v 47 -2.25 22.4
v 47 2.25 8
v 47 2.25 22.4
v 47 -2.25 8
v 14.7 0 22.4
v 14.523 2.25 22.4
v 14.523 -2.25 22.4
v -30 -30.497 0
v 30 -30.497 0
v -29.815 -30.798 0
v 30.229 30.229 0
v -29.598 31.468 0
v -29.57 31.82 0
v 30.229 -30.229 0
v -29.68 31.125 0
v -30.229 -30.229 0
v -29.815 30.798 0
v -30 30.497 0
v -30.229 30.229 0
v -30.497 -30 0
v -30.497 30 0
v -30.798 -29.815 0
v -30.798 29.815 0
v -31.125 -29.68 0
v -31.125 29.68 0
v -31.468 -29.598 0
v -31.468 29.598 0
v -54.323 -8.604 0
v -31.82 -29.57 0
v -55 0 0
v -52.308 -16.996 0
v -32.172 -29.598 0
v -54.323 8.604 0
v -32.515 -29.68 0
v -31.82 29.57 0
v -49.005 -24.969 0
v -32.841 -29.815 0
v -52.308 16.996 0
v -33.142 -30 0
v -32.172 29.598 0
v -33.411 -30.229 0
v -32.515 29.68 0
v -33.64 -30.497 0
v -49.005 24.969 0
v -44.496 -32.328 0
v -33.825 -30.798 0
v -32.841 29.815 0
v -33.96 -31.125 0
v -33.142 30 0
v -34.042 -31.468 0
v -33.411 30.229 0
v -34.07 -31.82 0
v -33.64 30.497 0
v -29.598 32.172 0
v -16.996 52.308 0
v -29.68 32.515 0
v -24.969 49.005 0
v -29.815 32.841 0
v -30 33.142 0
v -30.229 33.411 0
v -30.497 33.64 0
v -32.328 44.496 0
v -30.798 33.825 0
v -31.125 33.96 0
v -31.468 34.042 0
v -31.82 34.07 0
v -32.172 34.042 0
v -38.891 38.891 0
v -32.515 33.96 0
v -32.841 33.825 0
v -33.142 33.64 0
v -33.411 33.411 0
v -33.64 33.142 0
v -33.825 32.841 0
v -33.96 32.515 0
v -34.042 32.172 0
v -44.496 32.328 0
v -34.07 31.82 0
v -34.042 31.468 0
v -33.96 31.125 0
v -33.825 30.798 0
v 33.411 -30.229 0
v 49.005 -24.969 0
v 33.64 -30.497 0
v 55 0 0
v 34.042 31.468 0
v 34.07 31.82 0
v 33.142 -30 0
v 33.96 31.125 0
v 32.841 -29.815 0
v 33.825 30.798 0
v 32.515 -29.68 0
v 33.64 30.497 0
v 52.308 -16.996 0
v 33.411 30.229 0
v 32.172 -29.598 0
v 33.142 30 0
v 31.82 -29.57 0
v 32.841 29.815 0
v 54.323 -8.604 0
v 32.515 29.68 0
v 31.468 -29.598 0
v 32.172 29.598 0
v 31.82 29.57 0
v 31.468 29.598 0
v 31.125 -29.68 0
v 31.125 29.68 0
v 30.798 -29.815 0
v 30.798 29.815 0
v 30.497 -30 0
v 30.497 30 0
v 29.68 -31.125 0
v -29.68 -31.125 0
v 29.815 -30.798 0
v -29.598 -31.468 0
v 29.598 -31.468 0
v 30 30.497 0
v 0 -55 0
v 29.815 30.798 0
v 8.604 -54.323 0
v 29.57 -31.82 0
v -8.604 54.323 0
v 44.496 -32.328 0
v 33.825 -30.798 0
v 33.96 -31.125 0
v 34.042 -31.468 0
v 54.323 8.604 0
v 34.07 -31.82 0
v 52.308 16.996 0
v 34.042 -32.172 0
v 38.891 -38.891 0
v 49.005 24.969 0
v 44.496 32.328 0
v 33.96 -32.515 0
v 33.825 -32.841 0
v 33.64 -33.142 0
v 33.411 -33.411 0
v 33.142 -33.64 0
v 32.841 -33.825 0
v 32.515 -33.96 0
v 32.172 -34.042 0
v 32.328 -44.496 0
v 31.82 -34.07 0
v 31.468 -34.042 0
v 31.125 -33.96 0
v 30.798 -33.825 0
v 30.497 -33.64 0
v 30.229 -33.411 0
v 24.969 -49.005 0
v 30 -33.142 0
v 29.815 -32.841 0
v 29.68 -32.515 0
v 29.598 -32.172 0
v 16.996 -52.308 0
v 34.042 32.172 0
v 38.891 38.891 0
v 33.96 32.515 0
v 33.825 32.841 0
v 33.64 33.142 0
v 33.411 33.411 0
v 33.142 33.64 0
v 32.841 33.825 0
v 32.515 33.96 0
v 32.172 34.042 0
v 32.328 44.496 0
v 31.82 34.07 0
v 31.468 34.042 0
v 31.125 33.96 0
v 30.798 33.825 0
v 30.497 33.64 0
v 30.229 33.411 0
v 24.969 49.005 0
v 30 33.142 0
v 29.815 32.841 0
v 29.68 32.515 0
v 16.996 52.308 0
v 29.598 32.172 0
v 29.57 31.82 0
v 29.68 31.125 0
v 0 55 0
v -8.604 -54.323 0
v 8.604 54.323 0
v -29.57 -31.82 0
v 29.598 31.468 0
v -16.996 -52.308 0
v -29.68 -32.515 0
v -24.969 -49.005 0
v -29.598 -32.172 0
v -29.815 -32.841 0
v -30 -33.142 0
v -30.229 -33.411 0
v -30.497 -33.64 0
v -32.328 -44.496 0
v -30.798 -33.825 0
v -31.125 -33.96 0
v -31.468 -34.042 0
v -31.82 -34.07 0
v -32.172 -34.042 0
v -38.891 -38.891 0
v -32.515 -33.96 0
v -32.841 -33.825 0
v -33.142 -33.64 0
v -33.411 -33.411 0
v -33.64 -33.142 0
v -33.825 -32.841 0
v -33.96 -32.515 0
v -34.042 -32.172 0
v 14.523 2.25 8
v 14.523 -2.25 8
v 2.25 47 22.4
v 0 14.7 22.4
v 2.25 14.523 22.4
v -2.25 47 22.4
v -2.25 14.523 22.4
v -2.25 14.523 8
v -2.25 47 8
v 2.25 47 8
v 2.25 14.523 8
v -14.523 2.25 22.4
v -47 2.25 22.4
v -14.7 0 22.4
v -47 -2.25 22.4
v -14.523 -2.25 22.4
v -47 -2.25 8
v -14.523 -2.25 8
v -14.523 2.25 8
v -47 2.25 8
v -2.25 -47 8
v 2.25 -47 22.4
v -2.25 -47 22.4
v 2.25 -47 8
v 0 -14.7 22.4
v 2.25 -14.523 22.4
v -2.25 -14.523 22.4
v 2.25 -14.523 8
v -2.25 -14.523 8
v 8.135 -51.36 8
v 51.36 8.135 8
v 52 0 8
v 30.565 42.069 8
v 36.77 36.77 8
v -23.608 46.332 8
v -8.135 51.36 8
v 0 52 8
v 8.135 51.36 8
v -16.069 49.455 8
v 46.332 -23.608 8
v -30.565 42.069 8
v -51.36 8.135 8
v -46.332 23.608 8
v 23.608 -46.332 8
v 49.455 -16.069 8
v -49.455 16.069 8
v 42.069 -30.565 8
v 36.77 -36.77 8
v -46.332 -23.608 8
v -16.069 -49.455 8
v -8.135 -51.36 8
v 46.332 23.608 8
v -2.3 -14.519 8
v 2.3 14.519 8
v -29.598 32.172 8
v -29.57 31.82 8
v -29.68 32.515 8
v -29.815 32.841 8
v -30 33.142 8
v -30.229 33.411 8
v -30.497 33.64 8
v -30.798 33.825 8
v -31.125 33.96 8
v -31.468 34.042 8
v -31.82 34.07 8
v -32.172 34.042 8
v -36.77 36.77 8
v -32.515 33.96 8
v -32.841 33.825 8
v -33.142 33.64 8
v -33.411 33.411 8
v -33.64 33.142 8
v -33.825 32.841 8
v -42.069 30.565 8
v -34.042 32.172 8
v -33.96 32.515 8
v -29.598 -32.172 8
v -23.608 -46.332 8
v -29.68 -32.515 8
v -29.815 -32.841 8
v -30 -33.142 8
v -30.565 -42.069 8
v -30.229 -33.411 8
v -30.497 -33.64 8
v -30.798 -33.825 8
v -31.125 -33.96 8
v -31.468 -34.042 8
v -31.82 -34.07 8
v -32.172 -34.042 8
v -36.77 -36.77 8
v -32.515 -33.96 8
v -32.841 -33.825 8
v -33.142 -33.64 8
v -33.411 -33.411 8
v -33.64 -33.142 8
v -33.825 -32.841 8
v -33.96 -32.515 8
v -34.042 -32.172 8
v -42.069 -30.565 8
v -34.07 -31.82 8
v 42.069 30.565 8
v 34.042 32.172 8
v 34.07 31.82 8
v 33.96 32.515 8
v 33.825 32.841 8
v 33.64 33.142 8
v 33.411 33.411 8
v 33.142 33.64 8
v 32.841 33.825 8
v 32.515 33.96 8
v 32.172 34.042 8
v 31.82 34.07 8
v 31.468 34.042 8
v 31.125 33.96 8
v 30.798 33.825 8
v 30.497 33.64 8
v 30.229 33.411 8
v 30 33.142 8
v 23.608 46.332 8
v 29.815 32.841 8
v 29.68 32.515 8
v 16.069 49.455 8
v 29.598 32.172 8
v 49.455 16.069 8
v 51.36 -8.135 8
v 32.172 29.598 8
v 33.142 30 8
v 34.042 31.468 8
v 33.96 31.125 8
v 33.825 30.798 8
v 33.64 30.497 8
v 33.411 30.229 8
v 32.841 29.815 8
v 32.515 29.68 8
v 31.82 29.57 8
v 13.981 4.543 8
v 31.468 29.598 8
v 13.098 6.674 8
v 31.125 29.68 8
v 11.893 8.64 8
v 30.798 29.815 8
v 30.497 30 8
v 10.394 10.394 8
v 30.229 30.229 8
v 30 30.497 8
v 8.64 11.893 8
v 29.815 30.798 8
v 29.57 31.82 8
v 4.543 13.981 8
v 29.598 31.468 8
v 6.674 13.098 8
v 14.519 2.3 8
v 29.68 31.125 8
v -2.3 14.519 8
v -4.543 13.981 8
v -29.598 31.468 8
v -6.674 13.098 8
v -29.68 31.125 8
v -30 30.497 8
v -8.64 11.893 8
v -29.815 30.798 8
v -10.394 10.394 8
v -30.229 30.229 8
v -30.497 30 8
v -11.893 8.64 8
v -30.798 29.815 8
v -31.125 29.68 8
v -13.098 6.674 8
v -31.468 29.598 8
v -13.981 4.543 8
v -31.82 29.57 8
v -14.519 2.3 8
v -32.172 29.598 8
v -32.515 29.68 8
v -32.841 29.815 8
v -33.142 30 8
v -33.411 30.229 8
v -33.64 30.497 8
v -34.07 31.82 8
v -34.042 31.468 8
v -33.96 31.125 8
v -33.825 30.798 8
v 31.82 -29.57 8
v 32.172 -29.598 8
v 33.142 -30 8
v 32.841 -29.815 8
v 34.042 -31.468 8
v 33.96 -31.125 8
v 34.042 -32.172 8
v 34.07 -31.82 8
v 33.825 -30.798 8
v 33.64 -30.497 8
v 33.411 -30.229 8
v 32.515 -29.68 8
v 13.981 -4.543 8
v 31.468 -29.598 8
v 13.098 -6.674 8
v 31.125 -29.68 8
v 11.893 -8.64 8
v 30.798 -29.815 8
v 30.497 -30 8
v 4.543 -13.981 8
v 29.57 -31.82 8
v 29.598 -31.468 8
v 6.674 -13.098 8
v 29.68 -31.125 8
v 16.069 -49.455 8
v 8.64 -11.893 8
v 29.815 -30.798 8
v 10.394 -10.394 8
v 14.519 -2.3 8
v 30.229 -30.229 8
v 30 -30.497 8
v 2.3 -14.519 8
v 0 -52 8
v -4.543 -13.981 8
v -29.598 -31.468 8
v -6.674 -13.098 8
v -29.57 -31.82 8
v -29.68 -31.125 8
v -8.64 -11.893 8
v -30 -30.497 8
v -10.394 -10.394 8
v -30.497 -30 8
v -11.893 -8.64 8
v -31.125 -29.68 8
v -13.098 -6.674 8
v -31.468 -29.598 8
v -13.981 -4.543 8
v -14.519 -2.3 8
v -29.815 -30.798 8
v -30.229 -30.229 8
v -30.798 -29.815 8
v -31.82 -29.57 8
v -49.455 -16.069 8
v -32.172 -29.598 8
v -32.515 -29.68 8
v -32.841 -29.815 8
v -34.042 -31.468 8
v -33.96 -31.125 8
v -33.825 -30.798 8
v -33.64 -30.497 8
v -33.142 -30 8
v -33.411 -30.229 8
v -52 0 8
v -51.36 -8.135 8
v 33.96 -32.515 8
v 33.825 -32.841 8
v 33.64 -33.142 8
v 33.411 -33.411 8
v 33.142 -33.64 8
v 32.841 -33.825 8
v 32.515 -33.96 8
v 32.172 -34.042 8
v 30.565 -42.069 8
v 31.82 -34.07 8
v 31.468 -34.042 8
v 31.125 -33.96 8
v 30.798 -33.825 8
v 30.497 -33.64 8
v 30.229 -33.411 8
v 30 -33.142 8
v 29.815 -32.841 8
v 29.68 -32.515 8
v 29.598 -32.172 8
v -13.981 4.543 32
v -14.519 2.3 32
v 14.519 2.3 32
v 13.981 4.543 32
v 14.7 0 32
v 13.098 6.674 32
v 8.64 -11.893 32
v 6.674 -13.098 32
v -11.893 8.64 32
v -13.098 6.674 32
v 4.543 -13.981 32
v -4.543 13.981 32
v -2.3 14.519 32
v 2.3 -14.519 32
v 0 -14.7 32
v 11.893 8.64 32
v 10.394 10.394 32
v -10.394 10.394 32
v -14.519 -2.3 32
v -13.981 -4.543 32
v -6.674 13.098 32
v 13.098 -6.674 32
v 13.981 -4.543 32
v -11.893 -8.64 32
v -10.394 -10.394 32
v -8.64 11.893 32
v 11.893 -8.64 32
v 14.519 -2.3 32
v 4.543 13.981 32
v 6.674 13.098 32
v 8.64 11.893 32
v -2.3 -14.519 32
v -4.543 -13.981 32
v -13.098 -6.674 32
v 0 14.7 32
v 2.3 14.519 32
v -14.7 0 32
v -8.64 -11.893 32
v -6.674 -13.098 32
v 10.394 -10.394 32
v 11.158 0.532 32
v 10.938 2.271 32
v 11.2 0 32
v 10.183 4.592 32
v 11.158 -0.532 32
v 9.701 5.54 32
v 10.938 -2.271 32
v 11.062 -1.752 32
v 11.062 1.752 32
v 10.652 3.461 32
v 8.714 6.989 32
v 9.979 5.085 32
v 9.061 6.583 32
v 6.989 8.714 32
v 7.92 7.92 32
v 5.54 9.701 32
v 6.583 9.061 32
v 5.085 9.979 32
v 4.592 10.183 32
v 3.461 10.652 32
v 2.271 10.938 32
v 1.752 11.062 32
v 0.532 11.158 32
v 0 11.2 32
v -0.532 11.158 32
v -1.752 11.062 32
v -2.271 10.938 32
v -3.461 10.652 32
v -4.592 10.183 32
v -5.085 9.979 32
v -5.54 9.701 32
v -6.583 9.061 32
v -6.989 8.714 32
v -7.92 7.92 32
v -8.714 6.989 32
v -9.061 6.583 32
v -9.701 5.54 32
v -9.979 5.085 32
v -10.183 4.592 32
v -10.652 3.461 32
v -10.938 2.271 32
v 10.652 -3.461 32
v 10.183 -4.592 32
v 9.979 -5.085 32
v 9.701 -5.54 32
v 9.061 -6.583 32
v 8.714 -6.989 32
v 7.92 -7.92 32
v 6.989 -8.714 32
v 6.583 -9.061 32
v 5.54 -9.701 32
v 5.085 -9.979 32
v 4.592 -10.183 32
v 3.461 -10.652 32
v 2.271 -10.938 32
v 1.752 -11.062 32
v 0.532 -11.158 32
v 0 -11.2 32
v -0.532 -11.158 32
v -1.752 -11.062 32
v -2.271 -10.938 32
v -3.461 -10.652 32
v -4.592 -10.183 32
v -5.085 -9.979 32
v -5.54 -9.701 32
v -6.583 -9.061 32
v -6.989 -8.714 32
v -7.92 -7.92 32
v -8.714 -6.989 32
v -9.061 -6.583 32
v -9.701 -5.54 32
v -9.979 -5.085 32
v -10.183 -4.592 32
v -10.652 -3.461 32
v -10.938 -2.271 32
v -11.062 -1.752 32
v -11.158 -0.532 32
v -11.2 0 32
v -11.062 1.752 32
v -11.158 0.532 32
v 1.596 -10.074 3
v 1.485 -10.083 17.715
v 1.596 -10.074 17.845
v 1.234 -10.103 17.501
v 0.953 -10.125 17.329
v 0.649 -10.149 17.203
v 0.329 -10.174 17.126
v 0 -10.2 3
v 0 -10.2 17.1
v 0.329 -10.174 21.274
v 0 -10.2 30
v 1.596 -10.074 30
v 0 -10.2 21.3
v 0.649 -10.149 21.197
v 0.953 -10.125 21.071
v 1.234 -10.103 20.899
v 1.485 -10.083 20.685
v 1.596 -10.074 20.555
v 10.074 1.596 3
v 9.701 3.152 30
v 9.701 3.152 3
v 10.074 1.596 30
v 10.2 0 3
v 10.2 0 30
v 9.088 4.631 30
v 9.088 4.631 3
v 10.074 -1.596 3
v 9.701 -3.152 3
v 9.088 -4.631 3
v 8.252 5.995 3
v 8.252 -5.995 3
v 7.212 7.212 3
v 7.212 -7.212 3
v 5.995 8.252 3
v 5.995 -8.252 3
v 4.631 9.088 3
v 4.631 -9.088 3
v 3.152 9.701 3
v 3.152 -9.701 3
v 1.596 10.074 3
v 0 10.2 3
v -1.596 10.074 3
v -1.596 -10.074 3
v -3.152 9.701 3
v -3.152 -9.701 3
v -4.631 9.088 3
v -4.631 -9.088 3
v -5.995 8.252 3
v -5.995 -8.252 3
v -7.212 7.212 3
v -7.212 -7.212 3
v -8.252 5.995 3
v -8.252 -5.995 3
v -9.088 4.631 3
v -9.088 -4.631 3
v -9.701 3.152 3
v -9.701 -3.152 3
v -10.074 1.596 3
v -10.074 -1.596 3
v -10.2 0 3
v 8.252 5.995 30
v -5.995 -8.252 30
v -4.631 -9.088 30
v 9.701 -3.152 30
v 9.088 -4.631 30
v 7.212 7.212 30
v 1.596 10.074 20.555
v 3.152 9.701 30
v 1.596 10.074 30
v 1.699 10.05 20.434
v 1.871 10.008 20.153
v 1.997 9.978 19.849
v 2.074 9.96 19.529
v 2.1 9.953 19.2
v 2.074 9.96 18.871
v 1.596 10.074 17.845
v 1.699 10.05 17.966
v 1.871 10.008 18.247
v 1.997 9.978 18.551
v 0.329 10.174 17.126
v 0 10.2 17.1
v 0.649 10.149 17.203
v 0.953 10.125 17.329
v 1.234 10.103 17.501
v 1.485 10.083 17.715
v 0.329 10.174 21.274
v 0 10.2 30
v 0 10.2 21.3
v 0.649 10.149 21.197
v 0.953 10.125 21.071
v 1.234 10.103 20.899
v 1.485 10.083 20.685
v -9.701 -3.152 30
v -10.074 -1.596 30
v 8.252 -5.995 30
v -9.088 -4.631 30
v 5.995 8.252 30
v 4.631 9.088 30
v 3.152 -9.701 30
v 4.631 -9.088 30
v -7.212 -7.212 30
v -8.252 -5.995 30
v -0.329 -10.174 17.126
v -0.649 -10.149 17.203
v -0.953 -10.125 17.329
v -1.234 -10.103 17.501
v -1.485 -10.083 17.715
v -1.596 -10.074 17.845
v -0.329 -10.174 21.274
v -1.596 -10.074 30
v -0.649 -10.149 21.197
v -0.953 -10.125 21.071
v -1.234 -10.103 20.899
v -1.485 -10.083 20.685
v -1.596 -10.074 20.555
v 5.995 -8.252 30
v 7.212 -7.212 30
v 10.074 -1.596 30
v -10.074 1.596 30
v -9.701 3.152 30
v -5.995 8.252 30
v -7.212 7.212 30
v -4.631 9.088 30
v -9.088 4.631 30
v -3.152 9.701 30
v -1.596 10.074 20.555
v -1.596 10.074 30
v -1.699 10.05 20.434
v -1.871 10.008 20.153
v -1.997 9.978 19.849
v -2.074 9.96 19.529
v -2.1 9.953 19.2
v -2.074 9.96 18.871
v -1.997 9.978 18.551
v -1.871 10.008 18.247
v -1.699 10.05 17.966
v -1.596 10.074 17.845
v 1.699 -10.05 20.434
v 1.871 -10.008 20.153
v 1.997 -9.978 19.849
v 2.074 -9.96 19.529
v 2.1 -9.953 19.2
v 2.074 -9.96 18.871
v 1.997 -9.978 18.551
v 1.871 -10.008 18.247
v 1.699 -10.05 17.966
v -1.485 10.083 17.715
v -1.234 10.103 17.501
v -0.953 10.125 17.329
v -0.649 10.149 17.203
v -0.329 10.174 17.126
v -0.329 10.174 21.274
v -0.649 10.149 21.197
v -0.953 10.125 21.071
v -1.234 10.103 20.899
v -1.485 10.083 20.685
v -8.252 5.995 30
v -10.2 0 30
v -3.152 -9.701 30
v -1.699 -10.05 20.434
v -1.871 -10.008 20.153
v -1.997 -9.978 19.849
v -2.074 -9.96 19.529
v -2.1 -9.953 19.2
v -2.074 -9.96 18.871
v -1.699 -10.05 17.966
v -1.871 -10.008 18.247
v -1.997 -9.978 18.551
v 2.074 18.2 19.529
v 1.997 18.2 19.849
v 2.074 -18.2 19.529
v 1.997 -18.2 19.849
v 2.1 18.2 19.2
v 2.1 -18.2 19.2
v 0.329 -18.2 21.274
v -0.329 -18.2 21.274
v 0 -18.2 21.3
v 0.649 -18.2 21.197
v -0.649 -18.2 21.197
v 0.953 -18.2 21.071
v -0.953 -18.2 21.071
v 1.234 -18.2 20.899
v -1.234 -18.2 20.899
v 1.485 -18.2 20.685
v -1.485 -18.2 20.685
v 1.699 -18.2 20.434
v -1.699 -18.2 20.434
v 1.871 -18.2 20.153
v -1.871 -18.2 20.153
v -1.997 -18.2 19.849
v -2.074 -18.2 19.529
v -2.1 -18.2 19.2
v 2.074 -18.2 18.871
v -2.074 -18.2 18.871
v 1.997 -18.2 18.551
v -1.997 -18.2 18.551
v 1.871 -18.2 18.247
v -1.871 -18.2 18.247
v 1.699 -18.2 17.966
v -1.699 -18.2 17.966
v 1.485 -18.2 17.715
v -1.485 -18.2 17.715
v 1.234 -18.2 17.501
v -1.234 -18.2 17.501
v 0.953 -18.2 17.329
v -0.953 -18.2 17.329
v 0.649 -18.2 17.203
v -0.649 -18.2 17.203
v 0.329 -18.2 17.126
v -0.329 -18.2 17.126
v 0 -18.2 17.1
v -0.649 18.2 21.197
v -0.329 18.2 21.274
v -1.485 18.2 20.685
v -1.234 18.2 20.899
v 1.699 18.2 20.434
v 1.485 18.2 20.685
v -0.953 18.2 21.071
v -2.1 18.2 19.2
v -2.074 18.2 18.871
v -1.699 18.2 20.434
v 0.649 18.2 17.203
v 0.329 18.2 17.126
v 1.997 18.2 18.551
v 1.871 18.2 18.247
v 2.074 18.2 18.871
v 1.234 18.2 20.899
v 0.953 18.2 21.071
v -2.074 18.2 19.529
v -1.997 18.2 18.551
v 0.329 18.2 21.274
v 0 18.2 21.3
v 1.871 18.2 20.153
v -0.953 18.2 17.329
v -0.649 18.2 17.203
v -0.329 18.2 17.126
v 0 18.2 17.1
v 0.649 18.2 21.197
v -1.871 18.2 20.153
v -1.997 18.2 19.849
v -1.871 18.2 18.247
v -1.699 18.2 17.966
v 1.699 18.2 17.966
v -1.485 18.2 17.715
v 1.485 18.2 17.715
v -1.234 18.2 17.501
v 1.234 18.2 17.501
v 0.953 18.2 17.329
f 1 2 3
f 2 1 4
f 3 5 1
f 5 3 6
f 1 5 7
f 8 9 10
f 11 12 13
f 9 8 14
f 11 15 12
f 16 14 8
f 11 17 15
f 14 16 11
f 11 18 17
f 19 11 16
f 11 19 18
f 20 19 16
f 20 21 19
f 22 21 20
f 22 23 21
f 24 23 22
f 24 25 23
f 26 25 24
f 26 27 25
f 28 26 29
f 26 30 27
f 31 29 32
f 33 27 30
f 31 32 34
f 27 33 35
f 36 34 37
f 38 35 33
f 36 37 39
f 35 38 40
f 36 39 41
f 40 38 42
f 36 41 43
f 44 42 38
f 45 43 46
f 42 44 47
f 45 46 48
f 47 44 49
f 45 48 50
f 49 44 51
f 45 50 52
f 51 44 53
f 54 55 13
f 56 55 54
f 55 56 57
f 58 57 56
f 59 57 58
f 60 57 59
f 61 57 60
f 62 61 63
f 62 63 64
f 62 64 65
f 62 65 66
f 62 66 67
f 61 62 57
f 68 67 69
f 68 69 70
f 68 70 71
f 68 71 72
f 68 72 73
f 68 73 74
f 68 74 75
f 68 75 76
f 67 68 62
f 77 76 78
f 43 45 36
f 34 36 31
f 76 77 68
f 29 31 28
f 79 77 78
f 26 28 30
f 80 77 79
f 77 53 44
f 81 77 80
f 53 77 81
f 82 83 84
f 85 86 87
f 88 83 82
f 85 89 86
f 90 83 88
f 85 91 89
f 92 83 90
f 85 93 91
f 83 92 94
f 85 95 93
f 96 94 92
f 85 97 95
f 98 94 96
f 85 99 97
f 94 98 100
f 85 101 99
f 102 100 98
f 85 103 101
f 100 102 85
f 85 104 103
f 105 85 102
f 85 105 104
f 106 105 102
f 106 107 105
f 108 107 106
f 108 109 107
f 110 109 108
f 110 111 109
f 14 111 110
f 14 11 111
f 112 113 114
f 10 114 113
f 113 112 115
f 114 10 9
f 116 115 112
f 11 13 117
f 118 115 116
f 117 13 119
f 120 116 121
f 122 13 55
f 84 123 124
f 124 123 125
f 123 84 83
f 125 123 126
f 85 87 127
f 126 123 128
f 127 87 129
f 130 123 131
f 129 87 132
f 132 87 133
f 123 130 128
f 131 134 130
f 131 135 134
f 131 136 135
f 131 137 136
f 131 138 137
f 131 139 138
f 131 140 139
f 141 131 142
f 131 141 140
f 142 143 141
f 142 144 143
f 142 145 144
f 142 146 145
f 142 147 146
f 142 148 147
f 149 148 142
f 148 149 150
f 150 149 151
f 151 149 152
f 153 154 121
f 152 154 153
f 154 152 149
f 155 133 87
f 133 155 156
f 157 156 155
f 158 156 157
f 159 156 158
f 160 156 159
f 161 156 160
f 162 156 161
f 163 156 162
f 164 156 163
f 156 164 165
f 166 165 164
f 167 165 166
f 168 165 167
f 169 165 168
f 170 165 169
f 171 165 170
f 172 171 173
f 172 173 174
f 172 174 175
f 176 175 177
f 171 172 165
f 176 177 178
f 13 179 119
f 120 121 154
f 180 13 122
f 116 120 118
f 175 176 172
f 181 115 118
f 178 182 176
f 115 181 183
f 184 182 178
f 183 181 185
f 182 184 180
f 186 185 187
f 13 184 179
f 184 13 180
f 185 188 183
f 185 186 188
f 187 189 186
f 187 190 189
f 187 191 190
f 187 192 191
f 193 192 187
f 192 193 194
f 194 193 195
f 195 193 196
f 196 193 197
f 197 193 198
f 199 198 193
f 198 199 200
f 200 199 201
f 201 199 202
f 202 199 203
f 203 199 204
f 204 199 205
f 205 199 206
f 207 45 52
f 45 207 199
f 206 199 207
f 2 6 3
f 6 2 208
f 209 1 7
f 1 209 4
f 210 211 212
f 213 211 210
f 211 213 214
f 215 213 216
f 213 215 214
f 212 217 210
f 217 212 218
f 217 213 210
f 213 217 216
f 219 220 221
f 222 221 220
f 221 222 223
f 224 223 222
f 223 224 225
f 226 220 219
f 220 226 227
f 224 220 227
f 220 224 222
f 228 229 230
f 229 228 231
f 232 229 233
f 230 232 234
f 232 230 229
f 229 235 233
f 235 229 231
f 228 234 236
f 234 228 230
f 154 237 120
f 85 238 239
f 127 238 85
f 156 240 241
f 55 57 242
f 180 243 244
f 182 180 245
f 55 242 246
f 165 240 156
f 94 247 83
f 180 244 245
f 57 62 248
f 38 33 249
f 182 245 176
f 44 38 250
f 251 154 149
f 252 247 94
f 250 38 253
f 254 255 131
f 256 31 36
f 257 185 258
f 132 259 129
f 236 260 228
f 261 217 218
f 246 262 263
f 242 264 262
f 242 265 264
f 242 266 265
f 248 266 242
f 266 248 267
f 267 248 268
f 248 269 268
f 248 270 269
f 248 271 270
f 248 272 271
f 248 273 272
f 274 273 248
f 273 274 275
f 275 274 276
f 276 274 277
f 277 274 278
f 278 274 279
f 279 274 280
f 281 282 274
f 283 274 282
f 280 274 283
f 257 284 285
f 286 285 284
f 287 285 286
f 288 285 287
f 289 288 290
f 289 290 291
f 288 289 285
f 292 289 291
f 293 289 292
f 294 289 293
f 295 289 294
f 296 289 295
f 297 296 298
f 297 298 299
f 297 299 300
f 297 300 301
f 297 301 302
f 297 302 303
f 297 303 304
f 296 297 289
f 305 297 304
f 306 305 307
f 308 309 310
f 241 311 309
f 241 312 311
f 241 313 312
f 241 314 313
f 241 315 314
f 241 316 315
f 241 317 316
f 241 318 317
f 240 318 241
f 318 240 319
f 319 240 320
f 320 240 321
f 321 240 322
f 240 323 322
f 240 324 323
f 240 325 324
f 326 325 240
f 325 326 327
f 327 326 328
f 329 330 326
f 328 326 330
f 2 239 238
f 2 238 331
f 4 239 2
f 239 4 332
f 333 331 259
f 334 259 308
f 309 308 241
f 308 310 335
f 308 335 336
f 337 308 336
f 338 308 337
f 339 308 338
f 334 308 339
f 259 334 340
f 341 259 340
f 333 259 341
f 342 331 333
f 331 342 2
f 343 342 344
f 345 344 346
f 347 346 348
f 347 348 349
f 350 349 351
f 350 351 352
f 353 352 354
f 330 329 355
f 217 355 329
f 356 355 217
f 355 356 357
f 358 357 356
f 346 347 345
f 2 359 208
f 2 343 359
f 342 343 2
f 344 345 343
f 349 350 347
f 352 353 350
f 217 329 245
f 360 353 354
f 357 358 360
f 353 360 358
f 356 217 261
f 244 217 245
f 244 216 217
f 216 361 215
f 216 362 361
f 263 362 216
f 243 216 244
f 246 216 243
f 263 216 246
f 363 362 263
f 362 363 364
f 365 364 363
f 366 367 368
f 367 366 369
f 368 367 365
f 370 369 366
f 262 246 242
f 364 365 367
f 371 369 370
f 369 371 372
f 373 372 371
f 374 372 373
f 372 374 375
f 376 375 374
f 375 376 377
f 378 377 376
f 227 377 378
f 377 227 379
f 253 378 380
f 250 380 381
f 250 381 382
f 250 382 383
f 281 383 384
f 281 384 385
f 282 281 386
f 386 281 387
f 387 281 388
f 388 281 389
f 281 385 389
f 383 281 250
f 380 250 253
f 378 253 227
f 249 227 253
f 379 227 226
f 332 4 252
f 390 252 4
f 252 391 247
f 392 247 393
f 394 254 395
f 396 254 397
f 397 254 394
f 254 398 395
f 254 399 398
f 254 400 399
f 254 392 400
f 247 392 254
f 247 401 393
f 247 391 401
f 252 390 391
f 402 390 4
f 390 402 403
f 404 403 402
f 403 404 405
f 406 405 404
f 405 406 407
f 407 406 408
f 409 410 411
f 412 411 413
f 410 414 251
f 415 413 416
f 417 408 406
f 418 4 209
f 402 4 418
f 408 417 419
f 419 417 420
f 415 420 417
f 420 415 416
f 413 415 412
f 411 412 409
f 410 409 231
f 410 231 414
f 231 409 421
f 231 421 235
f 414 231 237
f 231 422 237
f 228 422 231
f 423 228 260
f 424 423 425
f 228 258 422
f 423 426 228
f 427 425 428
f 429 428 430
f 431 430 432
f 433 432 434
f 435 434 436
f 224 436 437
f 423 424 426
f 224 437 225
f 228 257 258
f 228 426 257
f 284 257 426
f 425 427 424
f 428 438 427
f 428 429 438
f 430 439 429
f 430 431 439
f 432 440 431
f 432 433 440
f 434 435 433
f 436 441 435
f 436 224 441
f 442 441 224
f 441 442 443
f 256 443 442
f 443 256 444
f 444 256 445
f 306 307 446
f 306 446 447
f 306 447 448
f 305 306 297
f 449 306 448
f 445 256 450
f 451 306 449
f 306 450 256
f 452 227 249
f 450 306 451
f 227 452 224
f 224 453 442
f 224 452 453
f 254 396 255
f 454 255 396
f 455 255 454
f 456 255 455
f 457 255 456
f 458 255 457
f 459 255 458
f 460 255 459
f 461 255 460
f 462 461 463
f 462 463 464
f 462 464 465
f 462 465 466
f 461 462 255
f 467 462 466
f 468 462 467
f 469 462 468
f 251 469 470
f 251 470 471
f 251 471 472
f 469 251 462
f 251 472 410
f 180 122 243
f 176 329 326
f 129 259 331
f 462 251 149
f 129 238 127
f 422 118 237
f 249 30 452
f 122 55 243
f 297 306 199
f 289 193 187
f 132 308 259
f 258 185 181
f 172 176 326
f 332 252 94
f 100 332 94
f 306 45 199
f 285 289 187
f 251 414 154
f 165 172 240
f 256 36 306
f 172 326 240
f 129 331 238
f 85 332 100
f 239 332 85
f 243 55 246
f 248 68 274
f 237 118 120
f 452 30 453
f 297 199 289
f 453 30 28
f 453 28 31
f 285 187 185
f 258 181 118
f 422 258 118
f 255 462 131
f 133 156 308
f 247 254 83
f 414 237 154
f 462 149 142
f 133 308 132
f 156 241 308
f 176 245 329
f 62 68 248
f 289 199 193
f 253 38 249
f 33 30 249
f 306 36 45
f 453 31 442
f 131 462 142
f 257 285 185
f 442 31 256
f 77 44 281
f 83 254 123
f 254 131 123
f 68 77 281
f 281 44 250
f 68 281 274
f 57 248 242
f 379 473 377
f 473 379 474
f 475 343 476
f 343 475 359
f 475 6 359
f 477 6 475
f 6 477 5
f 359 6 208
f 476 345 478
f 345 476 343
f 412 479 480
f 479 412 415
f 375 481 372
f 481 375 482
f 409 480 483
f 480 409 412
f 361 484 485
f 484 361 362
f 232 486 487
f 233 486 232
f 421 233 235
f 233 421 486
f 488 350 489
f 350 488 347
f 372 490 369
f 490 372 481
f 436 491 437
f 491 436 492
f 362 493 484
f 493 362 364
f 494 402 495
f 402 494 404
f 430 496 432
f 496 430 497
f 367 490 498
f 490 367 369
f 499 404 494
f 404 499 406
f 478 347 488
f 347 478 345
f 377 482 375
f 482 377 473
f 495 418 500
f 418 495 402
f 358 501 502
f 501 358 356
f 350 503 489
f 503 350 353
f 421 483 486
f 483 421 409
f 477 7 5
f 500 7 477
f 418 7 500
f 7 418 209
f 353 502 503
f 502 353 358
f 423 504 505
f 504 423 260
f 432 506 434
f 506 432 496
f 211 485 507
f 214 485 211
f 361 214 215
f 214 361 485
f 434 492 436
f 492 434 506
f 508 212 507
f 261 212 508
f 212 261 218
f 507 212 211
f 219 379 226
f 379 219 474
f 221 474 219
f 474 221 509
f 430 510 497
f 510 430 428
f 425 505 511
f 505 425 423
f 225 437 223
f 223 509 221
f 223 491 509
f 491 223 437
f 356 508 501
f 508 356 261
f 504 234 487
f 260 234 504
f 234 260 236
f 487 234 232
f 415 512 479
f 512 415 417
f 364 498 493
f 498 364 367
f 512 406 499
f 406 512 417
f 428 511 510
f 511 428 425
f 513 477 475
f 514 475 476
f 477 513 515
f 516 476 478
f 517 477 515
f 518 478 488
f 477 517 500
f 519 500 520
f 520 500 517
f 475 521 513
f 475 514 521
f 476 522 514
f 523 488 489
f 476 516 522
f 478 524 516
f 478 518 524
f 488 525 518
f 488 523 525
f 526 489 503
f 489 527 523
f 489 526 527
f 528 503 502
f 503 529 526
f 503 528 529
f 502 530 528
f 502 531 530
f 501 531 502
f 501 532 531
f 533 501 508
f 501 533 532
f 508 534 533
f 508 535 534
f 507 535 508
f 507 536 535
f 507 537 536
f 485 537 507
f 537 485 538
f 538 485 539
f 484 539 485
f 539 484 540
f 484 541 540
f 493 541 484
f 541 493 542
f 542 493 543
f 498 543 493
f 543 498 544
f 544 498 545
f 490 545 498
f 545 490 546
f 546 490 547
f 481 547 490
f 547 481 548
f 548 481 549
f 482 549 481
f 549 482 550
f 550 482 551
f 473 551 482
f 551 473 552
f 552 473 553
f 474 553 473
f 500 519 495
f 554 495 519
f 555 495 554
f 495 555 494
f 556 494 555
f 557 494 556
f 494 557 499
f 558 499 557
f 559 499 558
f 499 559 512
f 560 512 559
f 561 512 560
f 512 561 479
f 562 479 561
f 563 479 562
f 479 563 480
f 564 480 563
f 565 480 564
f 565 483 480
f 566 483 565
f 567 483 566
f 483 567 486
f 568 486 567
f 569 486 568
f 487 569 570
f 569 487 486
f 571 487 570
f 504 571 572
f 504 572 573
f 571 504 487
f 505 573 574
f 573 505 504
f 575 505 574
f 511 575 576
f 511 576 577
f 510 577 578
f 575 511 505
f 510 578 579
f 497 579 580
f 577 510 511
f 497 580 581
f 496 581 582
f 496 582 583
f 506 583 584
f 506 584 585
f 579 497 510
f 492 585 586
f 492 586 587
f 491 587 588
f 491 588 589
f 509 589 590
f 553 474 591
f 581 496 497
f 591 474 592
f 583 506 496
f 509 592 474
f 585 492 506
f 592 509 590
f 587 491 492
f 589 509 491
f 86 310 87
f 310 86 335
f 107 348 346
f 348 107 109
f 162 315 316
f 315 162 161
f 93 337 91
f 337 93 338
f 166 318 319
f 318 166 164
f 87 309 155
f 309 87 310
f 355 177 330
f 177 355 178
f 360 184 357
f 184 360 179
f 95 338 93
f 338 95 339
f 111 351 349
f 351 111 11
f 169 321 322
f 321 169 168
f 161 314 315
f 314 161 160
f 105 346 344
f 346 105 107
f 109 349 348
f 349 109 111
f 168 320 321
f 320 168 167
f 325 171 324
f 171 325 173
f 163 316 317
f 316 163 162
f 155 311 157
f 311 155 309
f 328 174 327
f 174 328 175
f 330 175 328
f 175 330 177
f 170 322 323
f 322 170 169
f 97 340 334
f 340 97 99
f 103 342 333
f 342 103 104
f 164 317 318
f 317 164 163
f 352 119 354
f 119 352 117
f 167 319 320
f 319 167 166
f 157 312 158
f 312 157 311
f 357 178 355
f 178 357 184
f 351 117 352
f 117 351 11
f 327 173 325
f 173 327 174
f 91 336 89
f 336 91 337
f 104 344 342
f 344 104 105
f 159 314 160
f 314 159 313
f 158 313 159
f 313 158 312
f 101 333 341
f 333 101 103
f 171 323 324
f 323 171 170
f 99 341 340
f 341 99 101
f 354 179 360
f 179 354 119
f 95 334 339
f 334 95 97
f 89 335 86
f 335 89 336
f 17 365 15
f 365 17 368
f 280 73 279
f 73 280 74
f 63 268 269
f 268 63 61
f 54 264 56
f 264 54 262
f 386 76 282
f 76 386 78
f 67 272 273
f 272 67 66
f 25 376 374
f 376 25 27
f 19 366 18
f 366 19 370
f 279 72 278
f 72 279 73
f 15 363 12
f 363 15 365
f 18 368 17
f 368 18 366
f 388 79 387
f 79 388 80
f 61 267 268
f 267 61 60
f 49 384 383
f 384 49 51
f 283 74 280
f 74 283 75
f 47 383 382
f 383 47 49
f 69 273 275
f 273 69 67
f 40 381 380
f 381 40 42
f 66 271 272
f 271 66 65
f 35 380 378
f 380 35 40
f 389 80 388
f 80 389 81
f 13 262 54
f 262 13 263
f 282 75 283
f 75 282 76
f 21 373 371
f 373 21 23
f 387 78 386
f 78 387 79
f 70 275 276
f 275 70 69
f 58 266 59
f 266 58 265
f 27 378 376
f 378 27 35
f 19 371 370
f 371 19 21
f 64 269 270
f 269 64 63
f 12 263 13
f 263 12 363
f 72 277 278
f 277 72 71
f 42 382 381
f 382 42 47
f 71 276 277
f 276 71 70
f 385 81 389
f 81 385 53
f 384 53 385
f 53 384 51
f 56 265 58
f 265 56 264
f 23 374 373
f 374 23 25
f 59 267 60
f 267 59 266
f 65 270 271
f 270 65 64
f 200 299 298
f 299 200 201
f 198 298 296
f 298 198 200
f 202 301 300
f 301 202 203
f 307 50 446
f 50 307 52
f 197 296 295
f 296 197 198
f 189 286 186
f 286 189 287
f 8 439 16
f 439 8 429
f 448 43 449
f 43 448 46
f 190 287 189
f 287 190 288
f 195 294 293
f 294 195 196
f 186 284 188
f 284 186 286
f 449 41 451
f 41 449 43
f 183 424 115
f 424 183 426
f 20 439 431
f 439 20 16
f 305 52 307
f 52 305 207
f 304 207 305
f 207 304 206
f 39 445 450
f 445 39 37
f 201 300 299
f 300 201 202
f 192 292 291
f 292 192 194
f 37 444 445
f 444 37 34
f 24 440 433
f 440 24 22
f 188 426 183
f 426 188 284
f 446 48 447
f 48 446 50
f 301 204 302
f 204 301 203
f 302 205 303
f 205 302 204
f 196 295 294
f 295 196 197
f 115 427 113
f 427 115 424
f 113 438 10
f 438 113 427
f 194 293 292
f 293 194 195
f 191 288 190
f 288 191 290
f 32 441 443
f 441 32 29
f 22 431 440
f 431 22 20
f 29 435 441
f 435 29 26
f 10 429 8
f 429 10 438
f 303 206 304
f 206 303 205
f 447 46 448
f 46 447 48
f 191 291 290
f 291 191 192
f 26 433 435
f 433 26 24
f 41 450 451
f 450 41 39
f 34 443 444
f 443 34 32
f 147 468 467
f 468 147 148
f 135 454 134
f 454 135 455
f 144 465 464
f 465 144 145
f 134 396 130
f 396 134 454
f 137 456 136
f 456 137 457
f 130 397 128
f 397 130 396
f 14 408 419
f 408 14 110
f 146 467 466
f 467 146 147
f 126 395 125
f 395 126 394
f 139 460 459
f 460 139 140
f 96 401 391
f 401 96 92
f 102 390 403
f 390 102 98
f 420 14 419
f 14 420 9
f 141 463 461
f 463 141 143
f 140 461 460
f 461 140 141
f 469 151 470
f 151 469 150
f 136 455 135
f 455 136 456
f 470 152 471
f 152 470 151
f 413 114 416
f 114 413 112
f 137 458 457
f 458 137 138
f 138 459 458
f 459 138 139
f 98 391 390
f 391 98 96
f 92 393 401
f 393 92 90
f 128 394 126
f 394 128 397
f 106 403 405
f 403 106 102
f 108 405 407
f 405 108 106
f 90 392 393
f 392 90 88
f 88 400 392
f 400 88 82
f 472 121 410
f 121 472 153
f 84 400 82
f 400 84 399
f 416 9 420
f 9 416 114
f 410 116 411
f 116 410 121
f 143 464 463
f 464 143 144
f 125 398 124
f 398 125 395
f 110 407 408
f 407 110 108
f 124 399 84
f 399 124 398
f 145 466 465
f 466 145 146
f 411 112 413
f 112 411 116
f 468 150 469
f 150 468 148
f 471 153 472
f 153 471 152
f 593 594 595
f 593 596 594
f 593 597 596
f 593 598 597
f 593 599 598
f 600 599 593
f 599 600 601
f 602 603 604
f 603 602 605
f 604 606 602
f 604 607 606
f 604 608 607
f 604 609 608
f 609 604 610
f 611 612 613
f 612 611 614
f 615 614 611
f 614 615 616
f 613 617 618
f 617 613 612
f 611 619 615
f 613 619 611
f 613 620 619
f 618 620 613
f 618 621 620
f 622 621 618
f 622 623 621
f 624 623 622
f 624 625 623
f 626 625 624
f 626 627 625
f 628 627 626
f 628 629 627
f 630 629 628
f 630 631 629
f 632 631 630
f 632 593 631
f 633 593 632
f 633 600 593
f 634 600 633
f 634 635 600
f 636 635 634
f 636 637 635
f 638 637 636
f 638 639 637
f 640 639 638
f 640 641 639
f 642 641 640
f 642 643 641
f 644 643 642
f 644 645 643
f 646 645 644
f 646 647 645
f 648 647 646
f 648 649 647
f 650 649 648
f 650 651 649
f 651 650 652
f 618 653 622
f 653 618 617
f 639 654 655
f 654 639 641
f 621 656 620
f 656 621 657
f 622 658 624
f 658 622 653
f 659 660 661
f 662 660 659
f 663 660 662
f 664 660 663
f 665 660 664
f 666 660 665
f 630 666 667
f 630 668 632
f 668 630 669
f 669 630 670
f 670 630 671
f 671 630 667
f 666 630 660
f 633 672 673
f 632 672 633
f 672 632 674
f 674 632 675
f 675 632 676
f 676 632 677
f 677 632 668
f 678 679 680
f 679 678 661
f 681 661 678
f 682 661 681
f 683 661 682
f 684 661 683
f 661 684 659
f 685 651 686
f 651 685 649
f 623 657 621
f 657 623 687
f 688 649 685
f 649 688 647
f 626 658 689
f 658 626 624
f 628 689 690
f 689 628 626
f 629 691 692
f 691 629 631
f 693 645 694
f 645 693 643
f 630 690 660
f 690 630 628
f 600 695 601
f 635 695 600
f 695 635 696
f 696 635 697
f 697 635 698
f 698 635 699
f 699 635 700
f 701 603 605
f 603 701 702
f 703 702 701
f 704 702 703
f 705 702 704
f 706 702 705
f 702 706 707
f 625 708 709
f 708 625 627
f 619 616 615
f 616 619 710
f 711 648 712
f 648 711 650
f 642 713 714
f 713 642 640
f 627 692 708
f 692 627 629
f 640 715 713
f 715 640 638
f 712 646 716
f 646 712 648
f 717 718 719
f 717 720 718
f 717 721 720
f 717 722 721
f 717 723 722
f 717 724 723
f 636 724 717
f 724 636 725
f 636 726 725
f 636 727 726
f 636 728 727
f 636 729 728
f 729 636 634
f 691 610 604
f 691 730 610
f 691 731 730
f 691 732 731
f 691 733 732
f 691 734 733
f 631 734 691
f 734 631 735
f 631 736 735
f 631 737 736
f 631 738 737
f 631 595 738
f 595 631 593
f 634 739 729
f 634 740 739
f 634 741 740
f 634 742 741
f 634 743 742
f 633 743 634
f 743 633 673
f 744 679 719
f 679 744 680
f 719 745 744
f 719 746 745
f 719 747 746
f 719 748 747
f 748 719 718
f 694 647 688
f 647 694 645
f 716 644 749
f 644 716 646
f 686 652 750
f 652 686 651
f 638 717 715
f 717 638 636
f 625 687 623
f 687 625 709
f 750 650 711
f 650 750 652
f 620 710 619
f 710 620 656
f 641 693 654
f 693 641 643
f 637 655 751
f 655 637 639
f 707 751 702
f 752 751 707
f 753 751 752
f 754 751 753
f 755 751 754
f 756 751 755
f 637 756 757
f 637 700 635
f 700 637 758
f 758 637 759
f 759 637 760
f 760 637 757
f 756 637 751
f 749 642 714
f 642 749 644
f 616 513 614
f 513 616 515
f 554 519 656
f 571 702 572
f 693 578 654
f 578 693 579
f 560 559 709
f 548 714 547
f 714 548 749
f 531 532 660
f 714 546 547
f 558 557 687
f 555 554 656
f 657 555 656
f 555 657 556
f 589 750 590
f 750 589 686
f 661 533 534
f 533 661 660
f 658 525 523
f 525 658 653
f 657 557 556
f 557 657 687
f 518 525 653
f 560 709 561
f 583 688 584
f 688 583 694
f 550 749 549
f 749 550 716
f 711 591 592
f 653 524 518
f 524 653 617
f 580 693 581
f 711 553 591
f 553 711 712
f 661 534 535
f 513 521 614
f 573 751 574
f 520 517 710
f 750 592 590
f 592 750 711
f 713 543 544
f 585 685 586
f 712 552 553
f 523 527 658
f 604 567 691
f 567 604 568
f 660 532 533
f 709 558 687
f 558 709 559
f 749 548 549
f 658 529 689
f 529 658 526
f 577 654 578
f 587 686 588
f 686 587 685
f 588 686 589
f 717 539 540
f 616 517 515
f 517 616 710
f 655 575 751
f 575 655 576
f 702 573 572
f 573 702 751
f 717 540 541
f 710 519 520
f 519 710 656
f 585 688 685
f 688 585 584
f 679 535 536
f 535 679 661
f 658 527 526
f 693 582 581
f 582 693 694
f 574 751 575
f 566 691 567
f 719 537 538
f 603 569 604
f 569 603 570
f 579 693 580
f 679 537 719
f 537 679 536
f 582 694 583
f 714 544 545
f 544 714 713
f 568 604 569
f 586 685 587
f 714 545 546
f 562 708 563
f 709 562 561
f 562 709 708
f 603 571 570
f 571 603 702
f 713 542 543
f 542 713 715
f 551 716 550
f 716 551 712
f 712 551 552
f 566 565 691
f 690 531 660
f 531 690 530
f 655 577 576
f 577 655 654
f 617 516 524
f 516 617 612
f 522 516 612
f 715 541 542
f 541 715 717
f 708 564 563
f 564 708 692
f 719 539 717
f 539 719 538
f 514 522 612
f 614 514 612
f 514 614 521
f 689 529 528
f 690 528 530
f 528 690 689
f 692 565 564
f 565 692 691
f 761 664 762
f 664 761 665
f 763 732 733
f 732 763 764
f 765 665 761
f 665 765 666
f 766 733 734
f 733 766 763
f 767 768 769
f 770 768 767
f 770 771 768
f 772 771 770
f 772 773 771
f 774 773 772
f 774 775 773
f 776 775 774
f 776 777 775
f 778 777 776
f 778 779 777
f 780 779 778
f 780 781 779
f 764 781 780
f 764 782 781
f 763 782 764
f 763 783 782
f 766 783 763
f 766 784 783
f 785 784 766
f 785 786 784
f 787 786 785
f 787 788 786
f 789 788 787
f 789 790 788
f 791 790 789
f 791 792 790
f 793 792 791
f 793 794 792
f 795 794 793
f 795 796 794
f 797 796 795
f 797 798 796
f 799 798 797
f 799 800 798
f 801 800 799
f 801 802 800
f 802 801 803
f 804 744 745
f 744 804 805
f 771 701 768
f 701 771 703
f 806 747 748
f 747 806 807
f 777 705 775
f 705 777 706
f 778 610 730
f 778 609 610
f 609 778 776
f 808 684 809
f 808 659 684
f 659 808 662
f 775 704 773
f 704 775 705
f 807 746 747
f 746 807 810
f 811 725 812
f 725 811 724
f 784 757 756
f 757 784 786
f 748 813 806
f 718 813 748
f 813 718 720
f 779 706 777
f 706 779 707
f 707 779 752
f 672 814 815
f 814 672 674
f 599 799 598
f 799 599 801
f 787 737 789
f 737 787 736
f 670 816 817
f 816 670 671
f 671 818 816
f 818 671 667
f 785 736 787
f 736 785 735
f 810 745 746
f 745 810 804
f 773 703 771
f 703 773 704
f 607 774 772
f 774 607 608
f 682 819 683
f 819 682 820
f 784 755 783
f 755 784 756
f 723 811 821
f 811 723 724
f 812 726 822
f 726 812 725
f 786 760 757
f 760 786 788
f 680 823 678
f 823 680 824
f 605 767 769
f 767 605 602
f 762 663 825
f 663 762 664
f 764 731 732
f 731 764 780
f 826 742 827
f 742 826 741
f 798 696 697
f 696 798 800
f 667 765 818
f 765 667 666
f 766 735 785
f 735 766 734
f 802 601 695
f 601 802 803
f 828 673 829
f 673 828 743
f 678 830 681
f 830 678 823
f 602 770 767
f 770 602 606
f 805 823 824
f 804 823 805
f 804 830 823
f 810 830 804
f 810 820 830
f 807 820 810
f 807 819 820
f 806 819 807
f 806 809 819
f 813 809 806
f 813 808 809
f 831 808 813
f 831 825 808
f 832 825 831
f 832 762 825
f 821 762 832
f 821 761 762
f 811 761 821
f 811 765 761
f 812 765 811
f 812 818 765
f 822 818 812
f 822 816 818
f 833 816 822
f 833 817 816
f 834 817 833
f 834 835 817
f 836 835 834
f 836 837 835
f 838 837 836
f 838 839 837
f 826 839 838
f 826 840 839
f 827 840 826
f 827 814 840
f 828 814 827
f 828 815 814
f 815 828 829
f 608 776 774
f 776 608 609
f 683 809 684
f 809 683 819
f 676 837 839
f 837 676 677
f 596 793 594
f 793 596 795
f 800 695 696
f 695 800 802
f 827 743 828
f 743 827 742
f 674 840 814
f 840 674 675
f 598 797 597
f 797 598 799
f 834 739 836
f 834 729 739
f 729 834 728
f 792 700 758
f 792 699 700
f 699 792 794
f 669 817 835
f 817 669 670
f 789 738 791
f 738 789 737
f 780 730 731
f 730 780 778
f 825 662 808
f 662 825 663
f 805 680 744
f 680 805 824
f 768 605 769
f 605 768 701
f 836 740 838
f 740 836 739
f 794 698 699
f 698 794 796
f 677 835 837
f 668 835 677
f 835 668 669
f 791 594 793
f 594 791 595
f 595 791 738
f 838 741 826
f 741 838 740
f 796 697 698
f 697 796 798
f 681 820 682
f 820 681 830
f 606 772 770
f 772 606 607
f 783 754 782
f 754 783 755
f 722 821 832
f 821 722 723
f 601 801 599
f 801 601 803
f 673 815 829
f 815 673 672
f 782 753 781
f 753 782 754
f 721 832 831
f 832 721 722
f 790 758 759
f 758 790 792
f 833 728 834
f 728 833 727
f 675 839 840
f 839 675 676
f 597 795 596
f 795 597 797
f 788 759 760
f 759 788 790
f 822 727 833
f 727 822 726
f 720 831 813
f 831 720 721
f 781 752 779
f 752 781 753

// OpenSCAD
// ====================================================================
// Tower Base & Modular Mast (100% 3D-Printable)
// 
// Features:
// - Wide, stable holiday-styled baseplate (can be clamped, screwed, or weighted)
// - 20mm upper socket accepts:
//     Option A: Standard wooden dowel or PVC pipe (custom height)
//     Option B: Stackable 3D-printed lattice mast segments (provided below)
// ====================================================================

$fn = 40;

base_dia       = 110.0; // Wide footprint for stability against cable tension
base_th        = 8.0;   // Solid base thickness
socket_inner_d = 20.4;  // Fits 20mm dowel or lattice mast plug
socket_wall    = 4.5;
socket_h       = 32.0;

// 1. Sturdy Baseplate
module tower_base() {
    difference() {
        union() {
            // Main disc with beveled edge
            cylinder(d1 = base_dia, d2 = base_dia - 6, h = base_th);
            
            // Central socket column
            translate([0, 0, 0])
                cylinder(d = socket_inner_d + (socket_wall * 2), h = socket_h);
                
            // 4x Rigid support ribs
            for (a = [0 : 90 : 270]) {
                rotate([0, 0, a])
                    translate([socket_inner_d / 2, -socket_wall / 2, 0])
                        cube([base_dia / 2 - socket_inner_d / 2 - 8, socket_wall, socket_h * 0.7]);
            }
        }

        // Central dowel/mast socket with self-centering lead-in chamfer
        translate([0, 0, 3])
            cylinder(d = socket_inner_d, h = socket_h + 2);
        translate([0, 0, socket_h - 2])
            cylinder(d1 = socket_inner_d, d2 = socket_inner_d + 3.0, h = 3.0);

        // 4x Perimeter screw/mounting holes (optional hold-down screws/clamps)
        for (a = [45 : 90 : 315]) {
            rotate([0, 0, a])
                translate([base_dia / 2 - 10, 0, -1])
                    cylinder(d = 4.5, h = base_th + 4);
        }

        // Cross-pin clamp hole for socket
        translate([0, 0, socket_h * 0.6])
            rotate([90, 0, 0])
                cylinder(d = 4.2, h = socket_inner_d + 16, center = true);
    }
}

// 2. Optional 3D-Printable Lattice Mast Segment (Stackable)
module tower_mast_segment(height = 100) {
    difference() {
        union() {
            // Main lattice column
            cylinder(d = 20.0, h = height);
            
            // Lower plug that fits into tower_base socket
            translate([0, 0, -24])
                cylinder(d = 20.0, h = 24);
        }
        
        // Upper receiving socket for stacking another segment or tower head
        translate([0, 0, height - 24])
            cylinder(d = socket_inner_d, h = 26);
            
        // Hollow interior for lightness / wiring (pass motor wires internally in Phase 2!)
        cylinder(d = 12.0, h = height + 10, center = true);
        
        // Decorative / lightweight lattice cutouts
        for (z = [15 : 20 : height - 20]) {
            translate([0, 0, z])
                rotate([90, 0, 0])
                    cylinder(d = 10, h = 24, center = true);
            translate([0, 0, z + 10])
                rotate([0, 90, 0])
                    cylinder(d = 10, h = 24, center = true);
        }
    }
}

// ====================================================================
// Selection
// ====================================================================
part = "base"; // "base" or "mast"

if (part == "base") {
    tower_base();
} else if (part == "mast") {
    tower_mast_segment(100);
}
